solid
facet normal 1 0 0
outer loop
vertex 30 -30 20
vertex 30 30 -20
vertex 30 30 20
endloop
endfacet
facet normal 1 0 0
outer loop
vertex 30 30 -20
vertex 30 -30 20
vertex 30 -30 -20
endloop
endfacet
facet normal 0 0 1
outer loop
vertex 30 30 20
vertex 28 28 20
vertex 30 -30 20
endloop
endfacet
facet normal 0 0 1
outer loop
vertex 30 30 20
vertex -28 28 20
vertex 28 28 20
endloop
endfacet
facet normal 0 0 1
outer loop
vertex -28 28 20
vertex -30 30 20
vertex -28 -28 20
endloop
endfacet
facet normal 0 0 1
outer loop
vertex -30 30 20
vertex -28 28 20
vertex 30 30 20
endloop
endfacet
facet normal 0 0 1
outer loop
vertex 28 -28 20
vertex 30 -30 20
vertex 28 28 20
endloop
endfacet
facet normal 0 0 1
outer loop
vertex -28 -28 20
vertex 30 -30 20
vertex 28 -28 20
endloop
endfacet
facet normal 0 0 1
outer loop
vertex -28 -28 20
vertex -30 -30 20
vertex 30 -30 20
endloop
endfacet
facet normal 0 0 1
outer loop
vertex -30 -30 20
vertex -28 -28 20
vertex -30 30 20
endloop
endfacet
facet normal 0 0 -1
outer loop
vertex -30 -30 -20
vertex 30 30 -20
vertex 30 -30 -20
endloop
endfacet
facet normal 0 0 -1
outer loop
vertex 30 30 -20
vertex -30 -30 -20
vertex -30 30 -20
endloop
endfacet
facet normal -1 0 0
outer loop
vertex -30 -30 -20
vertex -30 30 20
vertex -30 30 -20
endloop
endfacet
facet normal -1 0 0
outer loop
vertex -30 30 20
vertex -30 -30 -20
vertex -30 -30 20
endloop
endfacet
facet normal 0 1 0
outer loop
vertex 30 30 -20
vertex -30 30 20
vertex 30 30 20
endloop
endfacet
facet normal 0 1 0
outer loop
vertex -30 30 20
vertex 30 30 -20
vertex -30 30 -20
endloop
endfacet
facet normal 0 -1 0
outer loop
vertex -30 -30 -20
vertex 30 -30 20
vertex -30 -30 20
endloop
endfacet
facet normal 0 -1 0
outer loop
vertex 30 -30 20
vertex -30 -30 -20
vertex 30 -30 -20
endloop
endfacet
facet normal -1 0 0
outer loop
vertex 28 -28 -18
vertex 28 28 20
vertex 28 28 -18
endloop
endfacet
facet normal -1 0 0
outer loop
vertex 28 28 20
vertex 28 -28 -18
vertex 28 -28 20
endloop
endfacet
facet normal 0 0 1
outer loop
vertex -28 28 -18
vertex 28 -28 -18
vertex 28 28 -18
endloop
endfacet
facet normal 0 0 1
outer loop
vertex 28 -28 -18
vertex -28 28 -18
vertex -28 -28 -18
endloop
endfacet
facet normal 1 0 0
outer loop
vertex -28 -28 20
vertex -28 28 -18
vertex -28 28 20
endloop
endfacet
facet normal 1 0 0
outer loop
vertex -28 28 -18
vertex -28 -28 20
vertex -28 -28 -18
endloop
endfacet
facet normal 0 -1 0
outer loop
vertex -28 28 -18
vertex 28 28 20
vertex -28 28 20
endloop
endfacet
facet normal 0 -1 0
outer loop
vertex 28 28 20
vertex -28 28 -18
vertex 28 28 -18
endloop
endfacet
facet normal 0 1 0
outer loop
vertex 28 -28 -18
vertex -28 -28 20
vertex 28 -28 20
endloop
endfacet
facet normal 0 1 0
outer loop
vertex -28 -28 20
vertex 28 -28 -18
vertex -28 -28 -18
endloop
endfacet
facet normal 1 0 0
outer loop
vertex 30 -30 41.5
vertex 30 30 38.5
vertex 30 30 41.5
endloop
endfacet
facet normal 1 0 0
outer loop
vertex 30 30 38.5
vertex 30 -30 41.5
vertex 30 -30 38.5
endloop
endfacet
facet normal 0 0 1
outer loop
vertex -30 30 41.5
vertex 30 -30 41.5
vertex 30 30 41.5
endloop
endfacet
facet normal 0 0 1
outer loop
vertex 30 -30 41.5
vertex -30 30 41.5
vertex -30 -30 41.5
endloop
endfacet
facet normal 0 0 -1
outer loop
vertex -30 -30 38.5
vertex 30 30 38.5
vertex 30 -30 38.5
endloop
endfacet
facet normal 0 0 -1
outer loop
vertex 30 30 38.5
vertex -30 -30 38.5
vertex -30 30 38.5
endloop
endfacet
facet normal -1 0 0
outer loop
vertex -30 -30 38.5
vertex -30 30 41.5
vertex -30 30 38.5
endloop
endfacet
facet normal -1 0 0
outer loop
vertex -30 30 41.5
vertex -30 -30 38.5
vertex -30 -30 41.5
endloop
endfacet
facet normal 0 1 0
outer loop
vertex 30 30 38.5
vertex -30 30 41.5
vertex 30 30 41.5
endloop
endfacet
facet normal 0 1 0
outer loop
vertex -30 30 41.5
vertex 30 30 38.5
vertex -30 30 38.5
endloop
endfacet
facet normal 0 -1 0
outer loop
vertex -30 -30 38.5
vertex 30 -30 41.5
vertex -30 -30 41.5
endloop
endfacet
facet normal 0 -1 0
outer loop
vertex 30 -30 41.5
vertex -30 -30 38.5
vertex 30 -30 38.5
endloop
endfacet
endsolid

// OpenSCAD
// --- 1. PARAMETERS (Shows up in the MakerWorld Customizer UI) ---
/* [Box Settings] */
box_width = 60;
box_length = 60;
box_height = 40;

/* [Lid Settings] */
lid_thickness = 3;

// --- 2. MAIN ASSEMBLY MODULE (Default View) ---
// MakerWorld uses the root assembly view to generate the 3D preview.
main_assembly();

module main_assembly() {
    // View both parts assembled together
    box_body();
    translate([0, 0, box_height]) lid();
}

// --- 3. MAKERWORLD MULTI-PLATE MODULES ---
// PMM automatically maps these exact module names to separate plates in the 3MF export.

module mw_plate_1() {
    // CRITICAL: Plate 1 cannot be empty, or validation will fail.
    // Orient the part flat on the print bed.
    box_body();
}

module mw_plate_2() {
    // The second plate contains the second part oriented for printing.
    lid();
}


// --- 4. INDIVIDUAL GEOMETRY MODULES ---
module box_body() {
    difference() {
        cube([box_width, box_length, box_height], center = true);
        translate([0, 0, 2])
            cube([box_width - 4, box_length - 4, box_height], center = true);
    }
}

module lid() {
    cube([box_width, box_length, lid_thickness], center = true);
}
